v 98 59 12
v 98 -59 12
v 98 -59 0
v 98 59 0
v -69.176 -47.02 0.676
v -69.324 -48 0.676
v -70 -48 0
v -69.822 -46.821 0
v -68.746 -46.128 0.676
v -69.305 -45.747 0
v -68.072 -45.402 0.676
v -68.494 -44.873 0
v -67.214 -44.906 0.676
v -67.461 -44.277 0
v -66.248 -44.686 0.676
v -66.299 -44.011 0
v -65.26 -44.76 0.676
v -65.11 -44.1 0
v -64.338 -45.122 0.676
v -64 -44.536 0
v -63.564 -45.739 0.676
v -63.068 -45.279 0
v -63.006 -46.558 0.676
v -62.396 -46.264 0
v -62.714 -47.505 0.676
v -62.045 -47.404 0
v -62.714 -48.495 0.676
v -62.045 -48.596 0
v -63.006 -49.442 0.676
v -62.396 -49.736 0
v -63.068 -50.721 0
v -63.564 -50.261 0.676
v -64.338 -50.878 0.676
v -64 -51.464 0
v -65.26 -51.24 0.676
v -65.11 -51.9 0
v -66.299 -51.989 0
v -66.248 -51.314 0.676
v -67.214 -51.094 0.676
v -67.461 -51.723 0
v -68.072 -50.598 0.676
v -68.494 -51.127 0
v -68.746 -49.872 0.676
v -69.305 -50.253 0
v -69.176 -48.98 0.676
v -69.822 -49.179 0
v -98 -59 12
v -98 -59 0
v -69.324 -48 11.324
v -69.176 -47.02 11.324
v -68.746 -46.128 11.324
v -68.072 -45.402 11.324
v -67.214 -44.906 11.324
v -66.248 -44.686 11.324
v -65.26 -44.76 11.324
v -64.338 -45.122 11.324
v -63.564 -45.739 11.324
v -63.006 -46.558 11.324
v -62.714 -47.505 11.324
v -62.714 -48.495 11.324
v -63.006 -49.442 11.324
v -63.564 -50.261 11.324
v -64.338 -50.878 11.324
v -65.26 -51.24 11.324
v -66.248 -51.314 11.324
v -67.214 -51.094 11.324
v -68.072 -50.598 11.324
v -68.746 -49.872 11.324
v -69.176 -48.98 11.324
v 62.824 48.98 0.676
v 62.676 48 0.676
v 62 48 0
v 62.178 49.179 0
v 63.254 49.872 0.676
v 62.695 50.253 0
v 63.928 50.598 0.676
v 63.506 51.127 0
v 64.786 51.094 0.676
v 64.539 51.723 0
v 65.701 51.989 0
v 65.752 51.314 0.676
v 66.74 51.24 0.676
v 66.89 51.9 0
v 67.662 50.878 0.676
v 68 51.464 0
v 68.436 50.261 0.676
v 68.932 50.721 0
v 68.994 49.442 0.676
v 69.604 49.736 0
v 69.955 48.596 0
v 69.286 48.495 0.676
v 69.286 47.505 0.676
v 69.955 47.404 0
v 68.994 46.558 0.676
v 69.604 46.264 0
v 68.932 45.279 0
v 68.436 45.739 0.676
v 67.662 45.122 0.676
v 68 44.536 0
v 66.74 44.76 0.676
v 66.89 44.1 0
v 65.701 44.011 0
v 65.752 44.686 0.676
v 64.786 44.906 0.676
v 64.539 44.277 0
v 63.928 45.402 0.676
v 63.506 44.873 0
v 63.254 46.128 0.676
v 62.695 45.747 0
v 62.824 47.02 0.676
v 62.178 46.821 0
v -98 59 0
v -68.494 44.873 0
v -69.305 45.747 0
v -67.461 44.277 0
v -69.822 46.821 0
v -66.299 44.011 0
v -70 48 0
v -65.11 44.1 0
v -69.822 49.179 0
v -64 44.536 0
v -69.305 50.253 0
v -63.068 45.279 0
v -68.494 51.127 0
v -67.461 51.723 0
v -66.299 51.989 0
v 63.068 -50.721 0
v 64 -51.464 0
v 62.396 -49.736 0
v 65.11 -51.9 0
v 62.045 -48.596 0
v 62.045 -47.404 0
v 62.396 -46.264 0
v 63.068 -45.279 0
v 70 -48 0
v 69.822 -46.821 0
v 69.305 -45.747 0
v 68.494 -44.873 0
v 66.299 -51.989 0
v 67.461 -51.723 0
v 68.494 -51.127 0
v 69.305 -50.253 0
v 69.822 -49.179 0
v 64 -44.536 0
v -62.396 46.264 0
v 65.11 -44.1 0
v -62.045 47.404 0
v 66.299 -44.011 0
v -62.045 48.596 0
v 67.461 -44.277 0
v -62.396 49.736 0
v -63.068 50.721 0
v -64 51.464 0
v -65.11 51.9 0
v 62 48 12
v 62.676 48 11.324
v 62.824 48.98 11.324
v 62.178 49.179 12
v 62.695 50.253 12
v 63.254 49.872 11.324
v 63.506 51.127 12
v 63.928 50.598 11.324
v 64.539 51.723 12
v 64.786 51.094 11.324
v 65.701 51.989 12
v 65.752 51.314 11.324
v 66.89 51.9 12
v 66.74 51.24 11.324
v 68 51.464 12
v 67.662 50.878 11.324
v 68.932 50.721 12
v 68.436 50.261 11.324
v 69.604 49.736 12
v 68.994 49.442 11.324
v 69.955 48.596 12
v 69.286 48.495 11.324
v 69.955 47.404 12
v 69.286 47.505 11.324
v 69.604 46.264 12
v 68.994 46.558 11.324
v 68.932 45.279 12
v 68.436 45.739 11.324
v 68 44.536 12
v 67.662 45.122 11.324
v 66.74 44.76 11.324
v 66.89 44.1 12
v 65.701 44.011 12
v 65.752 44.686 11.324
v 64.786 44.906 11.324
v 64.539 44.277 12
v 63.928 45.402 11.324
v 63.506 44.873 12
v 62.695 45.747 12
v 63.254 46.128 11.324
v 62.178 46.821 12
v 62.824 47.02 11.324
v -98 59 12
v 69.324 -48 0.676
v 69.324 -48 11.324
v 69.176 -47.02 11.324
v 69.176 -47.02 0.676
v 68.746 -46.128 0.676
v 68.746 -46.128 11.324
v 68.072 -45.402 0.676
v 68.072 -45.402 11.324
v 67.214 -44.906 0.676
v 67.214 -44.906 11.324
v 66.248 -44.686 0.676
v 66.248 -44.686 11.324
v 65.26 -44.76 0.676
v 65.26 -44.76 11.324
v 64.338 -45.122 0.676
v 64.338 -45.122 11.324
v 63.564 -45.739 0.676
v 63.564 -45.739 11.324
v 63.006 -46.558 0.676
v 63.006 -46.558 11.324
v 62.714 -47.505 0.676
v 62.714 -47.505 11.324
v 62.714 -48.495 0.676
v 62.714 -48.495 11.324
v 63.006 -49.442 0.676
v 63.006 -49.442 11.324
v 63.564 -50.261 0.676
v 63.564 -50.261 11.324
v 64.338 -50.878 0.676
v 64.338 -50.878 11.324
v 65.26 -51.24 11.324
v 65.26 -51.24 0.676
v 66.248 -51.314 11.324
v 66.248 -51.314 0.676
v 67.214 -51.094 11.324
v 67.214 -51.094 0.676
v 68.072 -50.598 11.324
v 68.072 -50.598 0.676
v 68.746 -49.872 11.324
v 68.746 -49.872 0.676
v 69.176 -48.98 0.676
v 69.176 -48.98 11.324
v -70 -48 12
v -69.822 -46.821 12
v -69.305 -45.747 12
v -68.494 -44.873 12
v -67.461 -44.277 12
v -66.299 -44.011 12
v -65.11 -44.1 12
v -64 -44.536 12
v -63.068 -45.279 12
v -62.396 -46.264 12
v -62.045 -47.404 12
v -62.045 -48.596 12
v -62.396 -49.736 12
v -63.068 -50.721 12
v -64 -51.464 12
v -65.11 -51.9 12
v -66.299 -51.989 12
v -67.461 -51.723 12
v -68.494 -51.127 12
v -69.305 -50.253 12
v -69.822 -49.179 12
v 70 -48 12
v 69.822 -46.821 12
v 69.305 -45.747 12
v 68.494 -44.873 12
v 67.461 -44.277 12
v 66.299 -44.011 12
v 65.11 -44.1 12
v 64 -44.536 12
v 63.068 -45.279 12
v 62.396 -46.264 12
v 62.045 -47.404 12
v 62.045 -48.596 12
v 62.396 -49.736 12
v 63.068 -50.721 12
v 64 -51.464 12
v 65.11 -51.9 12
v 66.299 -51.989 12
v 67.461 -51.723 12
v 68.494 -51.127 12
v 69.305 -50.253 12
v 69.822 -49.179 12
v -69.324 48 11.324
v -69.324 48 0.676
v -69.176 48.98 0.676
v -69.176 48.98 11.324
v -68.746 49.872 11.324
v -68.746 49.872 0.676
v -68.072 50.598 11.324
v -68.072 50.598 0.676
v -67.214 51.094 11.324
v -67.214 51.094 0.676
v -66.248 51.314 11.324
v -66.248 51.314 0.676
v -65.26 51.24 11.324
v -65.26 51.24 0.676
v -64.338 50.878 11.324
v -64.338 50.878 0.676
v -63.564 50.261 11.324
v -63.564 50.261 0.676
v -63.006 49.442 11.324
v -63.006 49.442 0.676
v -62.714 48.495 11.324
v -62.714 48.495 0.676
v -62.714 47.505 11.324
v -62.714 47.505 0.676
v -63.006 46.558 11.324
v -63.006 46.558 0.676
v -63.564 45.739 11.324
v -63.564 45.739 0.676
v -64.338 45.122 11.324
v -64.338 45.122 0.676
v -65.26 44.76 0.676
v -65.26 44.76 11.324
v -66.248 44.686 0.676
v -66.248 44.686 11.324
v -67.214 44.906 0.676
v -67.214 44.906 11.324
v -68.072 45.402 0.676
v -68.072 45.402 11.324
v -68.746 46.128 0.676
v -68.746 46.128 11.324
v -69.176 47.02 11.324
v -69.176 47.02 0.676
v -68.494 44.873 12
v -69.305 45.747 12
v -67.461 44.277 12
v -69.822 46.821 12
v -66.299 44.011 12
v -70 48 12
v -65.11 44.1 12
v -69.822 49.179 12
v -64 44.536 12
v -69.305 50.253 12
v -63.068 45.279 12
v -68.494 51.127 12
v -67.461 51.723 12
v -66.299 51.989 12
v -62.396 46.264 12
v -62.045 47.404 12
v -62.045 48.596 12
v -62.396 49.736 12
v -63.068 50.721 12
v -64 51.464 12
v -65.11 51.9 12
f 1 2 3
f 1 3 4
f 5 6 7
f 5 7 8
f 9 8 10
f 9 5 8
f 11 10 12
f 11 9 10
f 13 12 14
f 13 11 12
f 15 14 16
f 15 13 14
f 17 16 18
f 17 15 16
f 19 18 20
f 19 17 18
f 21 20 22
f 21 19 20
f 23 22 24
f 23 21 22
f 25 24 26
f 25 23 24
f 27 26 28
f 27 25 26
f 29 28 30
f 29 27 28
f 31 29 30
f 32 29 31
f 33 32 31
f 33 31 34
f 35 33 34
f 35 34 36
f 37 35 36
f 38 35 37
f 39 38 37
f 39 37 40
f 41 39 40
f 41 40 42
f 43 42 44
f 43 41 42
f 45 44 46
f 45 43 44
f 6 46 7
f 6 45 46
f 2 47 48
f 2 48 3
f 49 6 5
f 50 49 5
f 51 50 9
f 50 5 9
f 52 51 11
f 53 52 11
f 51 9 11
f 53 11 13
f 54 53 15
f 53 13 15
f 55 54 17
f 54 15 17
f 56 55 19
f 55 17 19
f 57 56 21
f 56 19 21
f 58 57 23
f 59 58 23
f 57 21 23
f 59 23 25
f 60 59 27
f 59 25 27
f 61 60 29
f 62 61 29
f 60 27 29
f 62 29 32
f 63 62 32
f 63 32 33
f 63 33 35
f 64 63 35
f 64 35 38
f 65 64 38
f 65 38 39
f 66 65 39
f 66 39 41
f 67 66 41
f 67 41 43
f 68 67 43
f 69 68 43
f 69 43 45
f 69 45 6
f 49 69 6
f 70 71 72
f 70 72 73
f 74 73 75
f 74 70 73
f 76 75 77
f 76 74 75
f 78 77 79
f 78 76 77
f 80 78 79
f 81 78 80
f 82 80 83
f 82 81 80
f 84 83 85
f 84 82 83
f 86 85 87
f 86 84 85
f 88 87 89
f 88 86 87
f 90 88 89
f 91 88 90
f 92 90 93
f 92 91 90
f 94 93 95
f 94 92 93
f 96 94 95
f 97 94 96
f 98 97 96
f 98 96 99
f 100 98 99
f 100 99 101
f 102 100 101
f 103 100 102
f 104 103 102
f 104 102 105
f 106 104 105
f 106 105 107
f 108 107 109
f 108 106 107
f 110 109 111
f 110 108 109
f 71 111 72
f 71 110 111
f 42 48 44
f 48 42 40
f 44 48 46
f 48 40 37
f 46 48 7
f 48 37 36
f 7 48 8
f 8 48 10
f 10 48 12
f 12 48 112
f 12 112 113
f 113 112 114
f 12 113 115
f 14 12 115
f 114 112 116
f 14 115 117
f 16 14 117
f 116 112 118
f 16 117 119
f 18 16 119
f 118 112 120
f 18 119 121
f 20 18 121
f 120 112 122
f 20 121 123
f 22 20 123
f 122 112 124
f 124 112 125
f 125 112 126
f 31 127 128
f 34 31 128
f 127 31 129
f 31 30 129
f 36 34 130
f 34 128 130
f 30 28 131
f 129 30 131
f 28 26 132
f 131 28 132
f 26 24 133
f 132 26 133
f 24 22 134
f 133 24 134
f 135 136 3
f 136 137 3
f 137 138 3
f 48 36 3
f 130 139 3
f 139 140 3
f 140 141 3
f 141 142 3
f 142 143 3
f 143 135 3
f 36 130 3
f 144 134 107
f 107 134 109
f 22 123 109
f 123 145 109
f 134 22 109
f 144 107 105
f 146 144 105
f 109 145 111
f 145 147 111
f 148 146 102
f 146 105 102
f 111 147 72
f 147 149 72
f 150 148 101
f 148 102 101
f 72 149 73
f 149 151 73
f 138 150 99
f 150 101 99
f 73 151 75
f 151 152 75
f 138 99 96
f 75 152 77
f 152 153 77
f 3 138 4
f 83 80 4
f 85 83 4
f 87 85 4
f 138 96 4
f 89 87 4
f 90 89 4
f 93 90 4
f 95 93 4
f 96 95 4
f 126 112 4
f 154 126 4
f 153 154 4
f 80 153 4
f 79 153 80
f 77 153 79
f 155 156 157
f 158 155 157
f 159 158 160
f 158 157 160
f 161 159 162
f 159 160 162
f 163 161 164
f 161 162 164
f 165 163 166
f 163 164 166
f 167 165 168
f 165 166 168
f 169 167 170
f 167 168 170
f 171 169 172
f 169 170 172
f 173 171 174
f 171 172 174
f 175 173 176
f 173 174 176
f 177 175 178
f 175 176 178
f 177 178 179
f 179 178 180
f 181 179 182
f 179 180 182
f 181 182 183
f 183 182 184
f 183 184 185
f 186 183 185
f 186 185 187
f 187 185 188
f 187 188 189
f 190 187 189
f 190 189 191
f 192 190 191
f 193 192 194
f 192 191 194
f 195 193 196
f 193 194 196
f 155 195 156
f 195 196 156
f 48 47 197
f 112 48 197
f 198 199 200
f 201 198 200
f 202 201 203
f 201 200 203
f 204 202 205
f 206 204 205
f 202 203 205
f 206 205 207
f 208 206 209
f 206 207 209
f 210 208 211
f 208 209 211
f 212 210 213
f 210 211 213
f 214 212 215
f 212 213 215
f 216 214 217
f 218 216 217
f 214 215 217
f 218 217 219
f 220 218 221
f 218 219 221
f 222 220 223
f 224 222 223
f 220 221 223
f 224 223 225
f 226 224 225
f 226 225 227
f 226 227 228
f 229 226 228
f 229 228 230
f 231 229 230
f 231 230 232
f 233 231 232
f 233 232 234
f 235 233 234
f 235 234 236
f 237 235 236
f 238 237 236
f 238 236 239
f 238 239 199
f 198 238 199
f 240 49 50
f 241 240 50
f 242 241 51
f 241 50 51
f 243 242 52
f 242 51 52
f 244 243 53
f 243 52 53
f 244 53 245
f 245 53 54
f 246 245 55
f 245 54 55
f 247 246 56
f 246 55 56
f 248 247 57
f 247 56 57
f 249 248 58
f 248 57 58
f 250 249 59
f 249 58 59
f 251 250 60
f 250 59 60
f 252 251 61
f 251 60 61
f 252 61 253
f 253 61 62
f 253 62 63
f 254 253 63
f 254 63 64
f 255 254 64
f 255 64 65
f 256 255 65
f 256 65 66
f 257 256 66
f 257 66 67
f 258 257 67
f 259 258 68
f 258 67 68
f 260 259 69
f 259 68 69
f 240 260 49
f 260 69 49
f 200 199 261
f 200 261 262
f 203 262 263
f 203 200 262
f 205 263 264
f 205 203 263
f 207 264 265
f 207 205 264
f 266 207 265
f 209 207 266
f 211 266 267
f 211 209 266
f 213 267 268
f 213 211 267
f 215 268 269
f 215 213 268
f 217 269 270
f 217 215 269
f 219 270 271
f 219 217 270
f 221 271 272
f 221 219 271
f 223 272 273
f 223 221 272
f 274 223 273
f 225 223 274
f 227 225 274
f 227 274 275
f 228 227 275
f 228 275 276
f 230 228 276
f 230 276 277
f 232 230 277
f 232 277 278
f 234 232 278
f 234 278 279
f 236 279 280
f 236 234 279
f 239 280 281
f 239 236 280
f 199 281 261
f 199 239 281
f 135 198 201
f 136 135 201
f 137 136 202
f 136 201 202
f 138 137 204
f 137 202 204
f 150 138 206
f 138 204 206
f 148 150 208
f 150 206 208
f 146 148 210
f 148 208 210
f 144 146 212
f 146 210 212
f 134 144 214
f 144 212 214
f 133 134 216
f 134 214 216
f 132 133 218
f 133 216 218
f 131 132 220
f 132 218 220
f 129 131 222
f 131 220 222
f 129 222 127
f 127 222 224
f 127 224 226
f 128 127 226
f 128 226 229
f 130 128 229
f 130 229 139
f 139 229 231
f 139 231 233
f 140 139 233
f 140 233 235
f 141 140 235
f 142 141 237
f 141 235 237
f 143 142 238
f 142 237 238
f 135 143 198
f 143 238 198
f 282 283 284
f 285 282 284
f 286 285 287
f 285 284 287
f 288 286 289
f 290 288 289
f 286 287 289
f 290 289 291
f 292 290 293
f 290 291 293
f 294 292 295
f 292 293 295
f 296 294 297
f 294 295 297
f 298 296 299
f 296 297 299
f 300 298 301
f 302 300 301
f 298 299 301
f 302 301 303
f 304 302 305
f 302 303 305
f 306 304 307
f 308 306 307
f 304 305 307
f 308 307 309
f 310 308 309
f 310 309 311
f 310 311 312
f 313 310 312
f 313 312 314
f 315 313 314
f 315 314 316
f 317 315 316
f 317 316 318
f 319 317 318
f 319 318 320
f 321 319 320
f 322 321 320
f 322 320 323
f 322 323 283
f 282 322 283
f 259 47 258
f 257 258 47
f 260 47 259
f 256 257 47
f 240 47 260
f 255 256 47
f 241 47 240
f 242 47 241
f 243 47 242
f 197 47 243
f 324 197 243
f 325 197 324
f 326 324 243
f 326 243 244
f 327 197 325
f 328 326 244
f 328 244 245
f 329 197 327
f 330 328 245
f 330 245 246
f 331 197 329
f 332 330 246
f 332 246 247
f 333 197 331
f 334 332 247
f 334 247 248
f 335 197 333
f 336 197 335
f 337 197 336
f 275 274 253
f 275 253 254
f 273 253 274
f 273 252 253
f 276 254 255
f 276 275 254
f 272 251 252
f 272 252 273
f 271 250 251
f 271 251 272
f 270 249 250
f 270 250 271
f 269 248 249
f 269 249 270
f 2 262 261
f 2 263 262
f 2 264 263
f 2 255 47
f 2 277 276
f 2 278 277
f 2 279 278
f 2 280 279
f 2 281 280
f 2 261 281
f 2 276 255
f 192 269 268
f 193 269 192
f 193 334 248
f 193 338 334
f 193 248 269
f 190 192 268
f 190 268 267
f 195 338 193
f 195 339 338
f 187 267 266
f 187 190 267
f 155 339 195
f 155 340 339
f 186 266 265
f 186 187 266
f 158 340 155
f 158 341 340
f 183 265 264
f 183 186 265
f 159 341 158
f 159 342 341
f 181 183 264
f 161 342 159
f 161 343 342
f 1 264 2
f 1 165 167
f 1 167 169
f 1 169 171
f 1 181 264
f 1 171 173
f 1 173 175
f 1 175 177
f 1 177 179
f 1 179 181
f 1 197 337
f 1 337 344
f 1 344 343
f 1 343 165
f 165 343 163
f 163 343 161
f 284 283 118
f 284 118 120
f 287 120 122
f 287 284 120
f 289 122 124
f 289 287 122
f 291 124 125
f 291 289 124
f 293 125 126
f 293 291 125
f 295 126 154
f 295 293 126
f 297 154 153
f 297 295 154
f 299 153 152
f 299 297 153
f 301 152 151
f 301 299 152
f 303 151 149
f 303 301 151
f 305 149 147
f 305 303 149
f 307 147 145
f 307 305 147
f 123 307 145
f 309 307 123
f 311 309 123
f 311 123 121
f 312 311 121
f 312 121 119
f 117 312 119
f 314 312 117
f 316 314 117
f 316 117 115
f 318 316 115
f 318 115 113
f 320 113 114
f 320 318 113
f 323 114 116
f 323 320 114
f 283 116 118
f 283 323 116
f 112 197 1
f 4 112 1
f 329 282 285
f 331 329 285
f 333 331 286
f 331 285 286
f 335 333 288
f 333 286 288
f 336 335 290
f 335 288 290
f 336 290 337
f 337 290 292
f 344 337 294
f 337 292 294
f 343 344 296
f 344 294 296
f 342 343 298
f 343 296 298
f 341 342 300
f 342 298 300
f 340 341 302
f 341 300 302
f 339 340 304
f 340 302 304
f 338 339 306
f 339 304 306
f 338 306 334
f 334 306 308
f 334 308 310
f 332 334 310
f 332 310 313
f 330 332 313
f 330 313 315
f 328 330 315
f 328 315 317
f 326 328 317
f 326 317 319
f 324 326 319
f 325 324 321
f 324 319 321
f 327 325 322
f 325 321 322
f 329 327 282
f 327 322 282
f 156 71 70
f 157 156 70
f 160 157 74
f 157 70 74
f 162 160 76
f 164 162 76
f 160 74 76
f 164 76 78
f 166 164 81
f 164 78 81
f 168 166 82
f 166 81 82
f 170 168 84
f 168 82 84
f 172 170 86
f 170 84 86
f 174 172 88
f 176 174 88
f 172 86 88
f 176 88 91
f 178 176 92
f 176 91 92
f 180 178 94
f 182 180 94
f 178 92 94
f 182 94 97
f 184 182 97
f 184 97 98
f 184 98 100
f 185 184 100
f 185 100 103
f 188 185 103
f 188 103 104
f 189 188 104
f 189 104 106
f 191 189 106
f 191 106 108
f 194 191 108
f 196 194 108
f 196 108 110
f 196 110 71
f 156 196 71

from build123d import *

# Parameters (mm, degrees)
SKETCH_1_W        = 196
SKETCH_1_H        = 118
EXTRUDE_1_DEPTH   = 12
HOLE_WIZARD_M61_D = 6.647
HOLE_WIZARD_M62_D = 6.647
CHAMFER_1_SIZE    = 0.6765


with BuildPart() as part:
    # Эскиз1 → Бобышка-Вытянуть1 (new body)
    with BuildSketch(Plane.XY.offset(12)):
        Rectangle(SKETCH_1_W, SKETCH_1_H)
    extrude(amount=-EXTRUDE_1_DEPTH)

    # Отверстие с зазором M61 (through all)
    with Locations(Plane(origin=(0, 0, 0), x_dir=(-1, 0, 0), z_dir=(0, 0, -1))):
        with Locations((-66, -48)):
            Hole(HOLE_WIZARD_M61_D / 2)

    # Отверстие с зазором M62 (through all)
    with Locations(Plane.XY.offset(12)):
        with Locations((-66, 48), (-66, -48), (66, 48)):
            Hole(HOLE_WIZARD_M62_D / 2)

    # Фаска1
    chamfer_1_edges = [part.edges().sort_by_distance(p)[0] for p in [
        (62.6765, -48, 0),
        (62.6765, -48, 12),
        (69.3235, 48, 12),
        (69.3235, 48, 0),
        (-62.6765, -48, 12),
        (-62.6765, -48, 0),
        (-62.6765, 48, 12),
        (-62.6765, 48, 0),
    ]]
    chamfer(chamfer_1_edges, length=CHAMFER_1_SIZE)


solid = part.part
